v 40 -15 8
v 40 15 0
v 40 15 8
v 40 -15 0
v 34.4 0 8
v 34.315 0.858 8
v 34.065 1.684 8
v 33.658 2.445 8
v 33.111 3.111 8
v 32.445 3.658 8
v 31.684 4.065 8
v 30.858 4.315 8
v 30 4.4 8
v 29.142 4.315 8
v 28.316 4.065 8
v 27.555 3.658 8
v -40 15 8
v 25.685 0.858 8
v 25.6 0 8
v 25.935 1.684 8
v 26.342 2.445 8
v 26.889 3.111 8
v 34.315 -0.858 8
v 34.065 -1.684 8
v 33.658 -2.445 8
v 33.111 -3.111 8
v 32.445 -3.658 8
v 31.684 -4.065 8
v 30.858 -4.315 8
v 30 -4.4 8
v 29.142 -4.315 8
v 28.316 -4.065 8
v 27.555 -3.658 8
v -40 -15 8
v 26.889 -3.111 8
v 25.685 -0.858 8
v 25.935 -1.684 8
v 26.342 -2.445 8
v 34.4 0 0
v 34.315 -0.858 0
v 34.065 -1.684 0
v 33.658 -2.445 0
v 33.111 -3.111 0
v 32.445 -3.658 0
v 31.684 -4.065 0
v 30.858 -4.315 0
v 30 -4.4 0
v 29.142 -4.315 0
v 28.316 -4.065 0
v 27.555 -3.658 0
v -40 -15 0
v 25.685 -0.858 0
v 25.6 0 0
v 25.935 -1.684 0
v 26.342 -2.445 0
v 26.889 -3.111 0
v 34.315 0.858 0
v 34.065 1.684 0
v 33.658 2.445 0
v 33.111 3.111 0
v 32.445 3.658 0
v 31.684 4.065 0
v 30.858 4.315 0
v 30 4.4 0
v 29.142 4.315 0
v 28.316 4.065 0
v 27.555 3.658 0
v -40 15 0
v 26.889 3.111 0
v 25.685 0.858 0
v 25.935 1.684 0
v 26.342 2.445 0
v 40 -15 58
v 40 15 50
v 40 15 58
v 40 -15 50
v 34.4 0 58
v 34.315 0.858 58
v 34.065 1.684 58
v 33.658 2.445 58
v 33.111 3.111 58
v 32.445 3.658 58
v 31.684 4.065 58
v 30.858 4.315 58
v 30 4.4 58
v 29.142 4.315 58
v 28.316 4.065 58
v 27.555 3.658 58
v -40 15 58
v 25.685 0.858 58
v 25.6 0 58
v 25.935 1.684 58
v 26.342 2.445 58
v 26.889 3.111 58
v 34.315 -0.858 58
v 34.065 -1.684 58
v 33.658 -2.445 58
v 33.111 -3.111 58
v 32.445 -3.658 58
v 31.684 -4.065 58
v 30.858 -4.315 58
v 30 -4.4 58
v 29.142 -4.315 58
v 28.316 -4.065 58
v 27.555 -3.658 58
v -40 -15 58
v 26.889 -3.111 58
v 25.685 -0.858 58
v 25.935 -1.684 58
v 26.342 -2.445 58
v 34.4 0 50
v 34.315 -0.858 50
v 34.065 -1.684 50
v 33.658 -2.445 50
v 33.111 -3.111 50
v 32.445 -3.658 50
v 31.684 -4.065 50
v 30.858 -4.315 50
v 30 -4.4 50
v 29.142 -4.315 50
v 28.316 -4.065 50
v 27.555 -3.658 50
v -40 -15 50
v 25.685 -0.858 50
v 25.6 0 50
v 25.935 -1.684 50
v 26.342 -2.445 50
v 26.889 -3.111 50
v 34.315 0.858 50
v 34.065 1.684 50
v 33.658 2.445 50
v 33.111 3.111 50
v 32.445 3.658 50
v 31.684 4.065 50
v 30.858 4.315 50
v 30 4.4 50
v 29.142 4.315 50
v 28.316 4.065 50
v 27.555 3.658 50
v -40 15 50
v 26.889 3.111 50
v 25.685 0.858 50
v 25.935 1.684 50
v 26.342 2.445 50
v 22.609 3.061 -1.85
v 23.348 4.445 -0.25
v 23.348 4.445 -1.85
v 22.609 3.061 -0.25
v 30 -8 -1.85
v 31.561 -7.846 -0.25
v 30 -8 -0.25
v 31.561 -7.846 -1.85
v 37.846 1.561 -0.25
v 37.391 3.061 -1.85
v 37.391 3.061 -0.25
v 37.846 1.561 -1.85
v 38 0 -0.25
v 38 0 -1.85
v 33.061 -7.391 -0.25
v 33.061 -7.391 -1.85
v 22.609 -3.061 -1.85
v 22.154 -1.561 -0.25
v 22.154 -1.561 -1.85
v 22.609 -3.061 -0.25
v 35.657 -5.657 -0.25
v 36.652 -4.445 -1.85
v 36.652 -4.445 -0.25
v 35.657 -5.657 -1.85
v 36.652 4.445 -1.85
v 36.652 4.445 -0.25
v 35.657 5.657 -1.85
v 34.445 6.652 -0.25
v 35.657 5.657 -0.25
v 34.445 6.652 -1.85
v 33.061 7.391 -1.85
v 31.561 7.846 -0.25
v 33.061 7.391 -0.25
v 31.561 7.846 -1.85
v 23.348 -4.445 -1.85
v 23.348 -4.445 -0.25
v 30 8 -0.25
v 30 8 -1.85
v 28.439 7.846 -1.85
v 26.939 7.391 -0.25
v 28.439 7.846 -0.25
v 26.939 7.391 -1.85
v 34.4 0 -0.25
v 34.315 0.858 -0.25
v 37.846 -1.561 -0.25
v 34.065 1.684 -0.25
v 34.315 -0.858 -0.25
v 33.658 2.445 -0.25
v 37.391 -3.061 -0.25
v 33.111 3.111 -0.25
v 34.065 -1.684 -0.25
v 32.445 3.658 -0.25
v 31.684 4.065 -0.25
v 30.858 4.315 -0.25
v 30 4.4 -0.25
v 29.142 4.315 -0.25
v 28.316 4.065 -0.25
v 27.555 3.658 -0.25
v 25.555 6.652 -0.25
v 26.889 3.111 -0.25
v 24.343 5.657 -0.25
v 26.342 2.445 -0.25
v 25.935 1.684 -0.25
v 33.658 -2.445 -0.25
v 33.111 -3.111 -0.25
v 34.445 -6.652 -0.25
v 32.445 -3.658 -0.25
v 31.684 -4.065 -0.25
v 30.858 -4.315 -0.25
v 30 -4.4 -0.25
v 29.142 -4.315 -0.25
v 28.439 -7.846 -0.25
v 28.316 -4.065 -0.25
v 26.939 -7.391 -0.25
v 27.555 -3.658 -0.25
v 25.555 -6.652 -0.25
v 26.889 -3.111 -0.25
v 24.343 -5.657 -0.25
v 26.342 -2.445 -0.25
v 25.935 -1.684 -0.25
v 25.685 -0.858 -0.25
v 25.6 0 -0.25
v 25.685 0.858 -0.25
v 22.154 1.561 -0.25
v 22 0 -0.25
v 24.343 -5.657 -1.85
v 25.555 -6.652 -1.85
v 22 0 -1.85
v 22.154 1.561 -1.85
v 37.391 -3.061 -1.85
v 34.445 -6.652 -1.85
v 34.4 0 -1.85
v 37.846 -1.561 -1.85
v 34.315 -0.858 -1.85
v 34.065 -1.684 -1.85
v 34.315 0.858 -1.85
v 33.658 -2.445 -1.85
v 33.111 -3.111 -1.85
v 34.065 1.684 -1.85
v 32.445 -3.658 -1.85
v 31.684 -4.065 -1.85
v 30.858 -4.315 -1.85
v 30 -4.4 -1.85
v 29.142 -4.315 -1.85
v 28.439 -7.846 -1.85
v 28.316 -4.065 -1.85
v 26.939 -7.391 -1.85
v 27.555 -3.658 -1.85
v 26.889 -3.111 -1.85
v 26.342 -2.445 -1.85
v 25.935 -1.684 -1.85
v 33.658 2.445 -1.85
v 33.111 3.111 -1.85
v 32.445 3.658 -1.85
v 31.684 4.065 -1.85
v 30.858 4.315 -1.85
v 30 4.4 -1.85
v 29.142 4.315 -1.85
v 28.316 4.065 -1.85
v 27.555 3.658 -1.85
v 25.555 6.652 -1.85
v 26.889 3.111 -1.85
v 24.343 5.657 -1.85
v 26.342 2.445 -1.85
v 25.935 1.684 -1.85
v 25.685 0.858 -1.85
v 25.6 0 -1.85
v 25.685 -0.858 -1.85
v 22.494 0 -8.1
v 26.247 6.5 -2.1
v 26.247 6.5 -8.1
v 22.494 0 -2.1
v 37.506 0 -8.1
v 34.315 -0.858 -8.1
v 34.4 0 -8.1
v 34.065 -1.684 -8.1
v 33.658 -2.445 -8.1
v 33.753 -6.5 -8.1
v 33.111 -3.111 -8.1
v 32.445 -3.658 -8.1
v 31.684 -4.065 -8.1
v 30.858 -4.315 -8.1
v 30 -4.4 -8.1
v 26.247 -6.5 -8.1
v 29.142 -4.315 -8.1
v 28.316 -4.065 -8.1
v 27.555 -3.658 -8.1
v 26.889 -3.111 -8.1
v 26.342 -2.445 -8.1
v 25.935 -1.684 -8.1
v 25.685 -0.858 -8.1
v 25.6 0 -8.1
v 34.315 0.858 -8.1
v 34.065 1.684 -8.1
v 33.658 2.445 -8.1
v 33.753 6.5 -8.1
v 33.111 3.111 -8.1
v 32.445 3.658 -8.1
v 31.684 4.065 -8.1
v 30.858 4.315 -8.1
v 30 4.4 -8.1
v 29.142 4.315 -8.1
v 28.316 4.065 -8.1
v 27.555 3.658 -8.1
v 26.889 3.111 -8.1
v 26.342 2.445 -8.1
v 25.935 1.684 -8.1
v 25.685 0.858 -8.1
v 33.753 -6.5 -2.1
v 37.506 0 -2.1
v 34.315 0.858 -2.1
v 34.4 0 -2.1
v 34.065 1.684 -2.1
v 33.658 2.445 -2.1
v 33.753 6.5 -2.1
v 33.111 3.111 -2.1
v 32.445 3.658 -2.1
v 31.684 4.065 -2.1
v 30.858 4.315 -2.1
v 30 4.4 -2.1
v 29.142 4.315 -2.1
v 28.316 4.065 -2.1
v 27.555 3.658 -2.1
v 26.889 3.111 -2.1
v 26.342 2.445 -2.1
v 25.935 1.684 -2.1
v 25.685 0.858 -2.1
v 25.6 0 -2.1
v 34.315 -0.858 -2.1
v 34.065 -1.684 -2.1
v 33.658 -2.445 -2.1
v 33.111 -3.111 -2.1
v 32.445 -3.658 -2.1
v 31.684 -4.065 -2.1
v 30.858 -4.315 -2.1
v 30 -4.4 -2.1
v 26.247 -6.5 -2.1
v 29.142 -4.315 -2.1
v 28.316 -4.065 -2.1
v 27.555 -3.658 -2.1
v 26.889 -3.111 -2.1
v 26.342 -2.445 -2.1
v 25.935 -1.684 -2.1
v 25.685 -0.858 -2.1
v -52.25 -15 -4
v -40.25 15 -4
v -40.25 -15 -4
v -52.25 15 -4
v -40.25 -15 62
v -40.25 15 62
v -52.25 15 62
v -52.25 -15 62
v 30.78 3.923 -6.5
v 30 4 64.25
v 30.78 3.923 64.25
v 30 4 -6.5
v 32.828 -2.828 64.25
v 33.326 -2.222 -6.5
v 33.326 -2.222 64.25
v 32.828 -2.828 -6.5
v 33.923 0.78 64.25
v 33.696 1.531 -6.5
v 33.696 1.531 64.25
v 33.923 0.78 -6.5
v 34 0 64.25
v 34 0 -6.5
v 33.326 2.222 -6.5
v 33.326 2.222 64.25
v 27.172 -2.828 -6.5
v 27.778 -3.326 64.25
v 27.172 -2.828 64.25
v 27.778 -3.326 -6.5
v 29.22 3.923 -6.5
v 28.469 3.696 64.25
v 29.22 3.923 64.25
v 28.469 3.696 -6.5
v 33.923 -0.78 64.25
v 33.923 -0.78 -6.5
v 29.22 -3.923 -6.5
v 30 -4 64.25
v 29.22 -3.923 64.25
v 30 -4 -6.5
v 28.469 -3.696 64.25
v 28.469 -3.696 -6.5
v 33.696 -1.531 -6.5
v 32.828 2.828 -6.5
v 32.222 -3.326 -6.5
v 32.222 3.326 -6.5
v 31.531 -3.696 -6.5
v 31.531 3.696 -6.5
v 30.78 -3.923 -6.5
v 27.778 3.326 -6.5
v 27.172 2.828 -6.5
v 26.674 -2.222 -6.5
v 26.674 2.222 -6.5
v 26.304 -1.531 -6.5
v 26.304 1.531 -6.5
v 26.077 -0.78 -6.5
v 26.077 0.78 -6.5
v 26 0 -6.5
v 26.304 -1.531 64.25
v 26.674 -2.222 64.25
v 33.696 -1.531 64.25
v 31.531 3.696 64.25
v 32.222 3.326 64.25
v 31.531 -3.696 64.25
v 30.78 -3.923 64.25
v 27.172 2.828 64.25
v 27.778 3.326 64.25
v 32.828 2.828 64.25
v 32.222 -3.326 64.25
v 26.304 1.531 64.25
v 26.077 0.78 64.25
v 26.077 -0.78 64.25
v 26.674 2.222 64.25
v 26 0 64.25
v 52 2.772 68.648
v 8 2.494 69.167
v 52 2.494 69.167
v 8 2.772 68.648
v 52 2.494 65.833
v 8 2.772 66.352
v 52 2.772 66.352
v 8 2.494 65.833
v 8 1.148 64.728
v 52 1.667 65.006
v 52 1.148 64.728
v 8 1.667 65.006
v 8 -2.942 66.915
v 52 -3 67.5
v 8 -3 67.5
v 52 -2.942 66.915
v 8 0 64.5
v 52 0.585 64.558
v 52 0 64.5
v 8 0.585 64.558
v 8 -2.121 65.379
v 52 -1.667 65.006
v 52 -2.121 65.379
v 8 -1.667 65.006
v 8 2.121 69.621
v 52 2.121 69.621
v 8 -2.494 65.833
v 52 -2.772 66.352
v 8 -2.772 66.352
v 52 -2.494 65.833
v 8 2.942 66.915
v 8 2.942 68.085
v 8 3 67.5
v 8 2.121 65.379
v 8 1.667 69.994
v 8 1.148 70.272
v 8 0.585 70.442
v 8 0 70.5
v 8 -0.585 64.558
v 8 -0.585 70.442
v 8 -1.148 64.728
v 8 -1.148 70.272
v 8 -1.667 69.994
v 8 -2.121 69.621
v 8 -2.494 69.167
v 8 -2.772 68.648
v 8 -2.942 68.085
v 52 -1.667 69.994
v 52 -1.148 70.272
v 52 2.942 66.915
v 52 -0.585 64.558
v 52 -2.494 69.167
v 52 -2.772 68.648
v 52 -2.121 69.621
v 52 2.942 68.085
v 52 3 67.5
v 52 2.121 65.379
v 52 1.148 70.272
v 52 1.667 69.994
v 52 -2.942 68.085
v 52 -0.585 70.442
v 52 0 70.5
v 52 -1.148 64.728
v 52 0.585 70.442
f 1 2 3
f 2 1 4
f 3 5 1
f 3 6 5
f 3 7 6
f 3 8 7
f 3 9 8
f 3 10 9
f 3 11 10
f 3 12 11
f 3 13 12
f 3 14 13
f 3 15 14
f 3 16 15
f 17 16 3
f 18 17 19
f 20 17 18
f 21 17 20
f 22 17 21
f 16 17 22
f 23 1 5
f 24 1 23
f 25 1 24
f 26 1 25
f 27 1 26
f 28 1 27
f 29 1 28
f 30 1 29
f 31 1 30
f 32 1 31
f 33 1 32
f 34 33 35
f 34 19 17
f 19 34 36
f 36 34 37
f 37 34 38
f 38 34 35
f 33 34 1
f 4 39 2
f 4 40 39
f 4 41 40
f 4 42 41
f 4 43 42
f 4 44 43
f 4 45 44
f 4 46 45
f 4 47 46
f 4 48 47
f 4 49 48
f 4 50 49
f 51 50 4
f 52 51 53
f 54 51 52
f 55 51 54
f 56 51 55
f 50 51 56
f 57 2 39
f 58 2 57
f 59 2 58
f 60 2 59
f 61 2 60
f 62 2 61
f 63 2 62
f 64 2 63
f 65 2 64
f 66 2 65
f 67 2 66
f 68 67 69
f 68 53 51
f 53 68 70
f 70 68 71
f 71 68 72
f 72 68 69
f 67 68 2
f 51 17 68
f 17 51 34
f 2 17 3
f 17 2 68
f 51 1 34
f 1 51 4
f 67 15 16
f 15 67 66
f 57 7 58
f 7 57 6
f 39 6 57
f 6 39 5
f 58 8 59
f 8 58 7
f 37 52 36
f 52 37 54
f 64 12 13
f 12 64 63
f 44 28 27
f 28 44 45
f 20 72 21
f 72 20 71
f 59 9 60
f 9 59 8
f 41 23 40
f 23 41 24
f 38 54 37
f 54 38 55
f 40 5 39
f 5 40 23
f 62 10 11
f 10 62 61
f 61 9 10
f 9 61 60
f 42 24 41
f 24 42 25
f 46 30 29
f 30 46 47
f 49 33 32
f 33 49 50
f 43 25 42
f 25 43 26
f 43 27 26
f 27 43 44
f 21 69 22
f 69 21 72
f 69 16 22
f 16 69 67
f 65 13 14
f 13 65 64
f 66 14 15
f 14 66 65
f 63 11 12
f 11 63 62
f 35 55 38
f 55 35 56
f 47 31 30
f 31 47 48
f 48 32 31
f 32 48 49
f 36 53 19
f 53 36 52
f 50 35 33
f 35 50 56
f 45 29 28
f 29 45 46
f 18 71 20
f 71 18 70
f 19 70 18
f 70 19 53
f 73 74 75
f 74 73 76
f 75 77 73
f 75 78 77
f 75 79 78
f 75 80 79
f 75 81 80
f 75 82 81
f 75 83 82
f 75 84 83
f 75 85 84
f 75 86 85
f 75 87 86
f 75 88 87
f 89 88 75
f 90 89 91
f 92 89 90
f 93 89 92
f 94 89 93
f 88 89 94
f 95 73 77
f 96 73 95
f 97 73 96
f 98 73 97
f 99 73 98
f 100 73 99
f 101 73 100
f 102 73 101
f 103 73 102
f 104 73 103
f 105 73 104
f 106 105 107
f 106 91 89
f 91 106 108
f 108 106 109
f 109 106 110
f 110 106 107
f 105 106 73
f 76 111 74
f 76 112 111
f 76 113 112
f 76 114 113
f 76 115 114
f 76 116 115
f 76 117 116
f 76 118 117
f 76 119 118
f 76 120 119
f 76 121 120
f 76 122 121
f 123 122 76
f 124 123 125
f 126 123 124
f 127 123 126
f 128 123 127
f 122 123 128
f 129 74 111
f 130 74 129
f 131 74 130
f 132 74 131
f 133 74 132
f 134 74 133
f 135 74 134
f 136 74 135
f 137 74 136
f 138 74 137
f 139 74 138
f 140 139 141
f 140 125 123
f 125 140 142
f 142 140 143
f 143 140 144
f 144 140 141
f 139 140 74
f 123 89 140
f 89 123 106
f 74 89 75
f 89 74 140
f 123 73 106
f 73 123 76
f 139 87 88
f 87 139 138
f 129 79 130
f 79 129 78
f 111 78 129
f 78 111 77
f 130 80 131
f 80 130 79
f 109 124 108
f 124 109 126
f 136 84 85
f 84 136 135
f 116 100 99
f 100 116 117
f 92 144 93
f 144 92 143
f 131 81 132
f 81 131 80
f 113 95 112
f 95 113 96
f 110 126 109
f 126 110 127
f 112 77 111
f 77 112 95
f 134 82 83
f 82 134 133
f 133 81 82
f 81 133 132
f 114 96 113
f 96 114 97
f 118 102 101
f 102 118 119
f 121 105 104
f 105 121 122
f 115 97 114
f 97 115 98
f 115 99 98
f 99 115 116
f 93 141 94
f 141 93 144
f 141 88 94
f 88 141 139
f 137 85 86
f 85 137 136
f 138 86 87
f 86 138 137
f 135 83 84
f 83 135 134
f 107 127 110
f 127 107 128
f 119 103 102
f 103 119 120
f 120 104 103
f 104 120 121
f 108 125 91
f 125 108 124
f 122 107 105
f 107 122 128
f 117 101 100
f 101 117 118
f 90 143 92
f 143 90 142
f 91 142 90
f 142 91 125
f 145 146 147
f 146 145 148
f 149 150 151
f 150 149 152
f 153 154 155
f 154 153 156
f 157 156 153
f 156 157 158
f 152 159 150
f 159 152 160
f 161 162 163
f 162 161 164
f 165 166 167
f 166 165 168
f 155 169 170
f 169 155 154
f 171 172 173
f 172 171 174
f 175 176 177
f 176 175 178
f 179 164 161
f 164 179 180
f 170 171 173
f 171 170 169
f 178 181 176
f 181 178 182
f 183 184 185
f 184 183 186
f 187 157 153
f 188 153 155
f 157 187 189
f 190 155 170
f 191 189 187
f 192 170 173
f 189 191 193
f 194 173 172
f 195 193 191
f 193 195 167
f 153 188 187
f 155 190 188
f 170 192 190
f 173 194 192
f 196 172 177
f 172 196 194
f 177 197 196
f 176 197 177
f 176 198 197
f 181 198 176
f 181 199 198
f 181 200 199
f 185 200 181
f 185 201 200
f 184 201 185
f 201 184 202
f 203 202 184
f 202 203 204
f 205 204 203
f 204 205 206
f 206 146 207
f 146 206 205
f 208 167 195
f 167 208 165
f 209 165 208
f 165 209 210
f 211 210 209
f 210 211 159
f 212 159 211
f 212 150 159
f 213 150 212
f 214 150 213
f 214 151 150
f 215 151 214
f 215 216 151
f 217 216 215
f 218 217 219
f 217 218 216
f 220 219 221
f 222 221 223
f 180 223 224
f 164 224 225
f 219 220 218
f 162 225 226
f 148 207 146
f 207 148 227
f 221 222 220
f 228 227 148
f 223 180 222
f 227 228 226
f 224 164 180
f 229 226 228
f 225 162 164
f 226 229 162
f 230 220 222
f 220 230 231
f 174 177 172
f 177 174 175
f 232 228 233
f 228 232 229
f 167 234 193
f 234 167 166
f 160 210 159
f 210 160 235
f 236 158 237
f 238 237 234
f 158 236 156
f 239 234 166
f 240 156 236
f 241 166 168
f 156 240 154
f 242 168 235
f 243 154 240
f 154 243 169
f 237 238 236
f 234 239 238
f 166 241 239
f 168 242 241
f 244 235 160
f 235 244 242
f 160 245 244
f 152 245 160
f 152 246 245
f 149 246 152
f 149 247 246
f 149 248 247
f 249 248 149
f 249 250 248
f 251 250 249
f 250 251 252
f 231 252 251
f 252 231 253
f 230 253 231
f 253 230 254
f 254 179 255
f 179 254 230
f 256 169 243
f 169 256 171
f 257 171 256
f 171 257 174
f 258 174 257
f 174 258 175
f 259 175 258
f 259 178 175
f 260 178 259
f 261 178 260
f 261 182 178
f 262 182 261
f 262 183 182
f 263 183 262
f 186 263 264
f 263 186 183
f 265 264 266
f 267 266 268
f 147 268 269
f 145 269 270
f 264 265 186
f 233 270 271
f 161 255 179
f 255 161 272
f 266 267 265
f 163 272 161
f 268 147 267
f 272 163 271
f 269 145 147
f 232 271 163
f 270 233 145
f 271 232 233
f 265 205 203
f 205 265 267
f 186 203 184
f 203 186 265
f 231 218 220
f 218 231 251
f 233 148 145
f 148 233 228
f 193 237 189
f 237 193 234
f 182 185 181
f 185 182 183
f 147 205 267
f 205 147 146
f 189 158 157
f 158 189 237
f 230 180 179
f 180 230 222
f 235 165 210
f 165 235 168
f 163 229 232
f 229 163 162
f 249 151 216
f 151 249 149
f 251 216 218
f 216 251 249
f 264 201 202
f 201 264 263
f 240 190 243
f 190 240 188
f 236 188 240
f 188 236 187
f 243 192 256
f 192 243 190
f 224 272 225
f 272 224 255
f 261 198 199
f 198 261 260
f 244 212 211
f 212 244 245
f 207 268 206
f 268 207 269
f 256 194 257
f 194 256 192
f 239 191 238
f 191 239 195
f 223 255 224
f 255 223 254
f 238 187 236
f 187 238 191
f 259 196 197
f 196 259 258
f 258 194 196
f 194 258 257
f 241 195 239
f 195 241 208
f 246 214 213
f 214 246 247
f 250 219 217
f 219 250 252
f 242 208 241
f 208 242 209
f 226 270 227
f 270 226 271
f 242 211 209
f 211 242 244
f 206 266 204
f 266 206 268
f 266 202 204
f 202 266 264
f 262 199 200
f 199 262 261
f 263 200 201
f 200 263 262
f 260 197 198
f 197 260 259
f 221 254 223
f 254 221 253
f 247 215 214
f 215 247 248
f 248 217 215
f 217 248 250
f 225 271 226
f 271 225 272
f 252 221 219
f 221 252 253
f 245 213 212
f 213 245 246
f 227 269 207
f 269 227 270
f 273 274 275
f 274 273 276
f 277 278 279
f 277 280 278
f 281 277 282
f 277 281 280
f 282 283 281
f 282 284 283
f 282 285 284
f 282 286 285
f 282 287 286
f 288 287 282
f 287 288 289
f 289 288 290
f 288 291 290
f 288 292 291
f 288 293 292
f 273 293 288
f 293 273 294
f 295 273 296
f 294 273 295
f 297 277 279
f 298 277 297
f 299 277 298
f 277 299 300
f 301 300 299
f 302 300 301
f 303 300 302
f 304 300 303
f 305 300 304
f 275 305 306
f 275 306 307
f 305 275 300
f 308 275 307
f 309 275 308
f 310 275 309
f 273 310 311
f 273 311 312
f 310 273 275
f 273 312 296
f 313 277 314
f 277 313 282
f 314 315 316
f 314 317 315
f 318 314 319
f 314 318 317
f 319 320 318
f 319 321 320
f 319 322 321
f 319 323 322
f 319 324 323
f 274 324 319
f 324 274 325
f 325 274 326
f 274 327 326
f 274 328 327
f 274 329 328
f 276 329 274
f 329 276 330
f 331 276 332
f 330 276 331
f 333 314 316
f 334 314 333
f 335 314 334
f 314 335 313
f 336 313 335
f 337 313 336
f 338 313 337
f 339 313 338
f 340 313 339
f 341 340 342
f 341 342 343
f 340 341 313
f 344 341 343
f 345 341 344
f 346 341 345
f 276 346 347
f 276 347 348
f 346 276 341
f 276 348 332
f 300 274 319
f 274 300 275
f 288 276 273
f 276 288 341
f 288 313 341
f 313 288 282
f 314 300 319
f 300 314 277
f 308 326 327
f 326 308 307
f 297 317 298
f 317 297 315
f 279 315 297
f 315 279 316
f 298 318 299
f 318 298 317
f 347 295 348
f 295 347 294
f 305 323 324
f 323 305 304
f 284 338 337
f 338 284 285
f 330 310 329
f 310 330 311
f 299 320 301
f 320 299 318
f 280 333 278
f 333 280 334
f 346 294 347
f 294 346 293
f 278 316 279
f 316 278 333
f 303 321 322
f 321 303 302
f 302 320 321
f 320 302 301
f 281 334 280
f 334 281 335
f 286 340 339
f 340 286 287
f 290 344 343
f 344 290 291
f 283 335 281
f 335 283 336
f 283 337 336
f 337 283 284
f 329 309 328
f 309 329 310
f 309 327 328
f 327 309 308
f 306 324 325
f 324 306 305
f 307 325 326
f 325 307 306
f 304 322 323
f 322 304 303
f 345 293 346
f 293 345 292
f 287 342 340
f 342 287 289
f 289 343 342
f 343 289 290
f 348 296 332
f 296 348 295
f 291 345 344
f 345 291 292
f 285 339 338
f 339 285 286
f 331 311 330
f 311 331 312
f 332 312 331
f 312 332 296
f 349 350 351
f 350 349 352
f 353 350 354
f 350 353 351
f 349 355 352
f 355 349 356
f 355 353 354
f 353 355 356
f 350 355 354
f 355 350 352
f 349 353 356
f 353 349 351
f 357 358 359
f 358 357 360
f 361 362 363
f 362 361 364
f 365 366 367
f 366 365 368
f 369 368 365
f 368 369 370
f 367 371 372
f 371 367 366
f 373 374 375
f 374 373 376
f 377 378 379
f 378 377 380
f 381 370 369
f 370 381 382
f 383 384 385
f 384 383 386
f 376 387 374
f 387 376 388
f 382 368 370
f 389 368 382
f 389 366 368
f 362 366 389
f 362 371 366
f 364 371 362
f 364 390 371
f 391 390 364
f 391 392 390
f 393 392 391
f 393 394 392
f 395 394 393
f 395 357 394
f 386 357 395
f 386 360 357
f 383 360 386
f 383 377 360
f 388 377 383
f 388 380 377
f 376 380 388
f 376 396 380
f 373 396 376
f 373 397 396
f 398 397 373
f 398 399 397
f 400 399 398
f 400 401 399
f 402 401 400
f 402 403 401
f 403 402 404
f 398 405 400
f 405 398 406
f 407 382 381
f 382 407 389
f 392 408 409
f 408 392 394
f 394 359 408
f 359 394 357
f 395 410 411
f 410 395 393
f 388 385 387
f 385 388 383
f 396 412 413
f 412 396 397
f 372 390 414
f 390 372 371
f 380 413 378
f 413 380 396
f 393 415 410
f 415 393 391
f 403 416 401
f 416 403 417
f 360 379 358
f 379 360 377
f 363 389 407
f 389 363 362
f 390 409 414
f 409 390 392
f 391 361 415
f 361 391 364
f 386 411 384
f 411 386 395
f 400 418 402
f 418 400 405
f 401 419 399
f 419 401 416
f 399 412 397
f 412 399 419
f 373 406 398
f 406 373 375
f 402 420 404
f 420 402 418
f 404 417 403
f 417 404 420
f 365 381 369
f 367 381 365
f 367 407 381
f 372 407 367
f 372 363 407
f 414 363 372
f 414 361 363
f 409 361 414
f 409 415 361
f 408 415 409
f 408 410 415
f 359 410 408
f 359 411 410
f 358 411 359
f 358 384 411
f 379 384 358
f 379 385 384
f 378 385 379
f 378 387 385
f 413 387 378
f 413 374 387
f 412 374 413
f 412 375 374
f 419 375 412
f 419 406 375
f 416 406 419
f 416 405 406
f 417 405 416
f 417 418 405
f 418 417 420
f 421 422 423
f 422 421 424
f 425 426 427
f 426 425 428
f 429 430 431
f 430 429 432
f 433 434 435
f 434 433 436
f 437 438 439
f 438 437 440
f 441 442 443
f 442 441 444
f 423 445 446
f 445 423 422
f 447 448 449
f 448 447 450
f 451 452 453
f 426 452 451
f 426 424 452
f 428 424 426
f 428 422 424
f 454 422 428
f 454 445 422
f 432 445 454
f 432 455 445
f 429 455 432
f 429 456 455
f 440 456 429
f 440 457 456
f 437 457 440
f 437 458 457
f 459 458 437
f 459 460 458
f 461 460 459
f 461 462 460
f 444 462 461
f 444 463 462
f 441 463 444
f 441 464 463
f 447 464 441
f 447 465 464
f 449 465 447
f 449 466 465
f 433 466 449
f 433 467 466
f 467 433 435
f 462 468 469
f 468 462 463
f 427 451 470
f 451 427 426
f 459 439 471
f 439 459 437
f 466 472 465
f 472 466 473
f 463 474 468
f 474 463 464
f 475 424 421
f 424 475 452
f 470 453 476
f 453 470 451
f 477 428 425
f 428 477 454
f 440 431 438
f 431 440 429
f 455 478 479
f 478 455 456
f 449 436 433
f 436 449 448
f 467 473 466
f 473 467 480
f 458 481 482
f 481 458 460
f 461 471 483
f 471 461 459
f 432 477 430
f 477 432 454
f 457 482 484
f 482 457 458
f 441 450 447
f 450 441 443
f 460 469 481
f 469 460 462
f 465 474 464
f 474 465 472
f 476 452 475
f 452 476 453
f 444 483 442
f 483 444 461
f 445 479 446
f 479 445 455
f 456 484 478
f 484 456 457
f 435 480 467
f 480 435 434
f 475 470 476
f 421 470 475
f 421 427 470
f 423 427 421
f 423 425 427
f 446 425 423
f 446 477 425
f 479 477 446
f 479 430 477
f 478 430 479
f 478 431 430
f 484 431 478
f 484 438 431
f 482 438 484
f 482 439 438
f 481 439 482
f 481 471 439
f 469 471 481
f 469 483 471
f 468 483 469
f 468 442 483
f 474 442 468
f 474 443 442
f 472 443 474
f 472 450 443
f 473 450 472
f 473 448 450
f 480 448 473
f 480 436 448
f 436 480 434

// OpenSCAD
$fn = 32;

// ------------------------------------------------------------------------
// C clamp: throat 50 mm, screw d8
// Every part is its own module, assembly() places every instance.
// ------------------------------------------------------------------------

// --- part 1 ---
module clamp_arm() {
  difference() {
    translate([-40, -15, 0]) cube([80, 30, 8]);
    translate([30, 0, -1]) cylinder(h = 10, d = 8.8);
  }
}

// --- part 2 ---
module clamp_spine() {
  difference() {
    translate([-33, -15, 0]) cube([66, 30, 12]);
  }
}

// --- part 3 ---
module clamp_screw() {
  translate([0, 0, -35.375]) cylinder(h = 70.75, d = 8);
}

// --- part 4 ---
module clamp_washer() {
  difference() {
      translate([0, 0, 0]) cylinder(h = 1.6, d = 16);
      translate([0, 0, -1]) cylinder(h = 3.6, d = 8.8);
    }
}

// --- part 5 ---
module clamp_nut() {
  difference() {
    linear_extrude(height = 6) polygon(points = [[7.506, 0], [3.753, 6.5], [-3.753, 6.5], [-7.506, 0], [-3.753, -6.5], [3.753, -6.5]]);
    translate([0, 0, -1]) cylinder(h = 8, d = 8.8);
  }
}

// --- part 6 ---
module tommy_bar() {
  translate([0, 0, -22]) cylinder(h = 44, d = 6);
}

// --- assembly ---
module assembly() {
  color([0.80, 0.24, 0.20]) translate([0, 0, 0]) rotate([0, 0, 0]) clamp_arm();
  color([0.20, 0.45, 0.75]) translate([0, 0, 50]) rotate([0, 0, 0]) clamp_arm();
  color([0.25, 0.62, 0.32]) translate([-52.25, 0, 29]) rotate([0, 90, 0]) clamp_spine();
  color([0.92, 0.70, 0.18]) translate([30, 0, 28.875]) rotate([0, 0, 0]) clamp_screw();
  color([0.58, 0.35, 0.70]) translate([30, 0, -1.85]) rotate([0, 0, 0]) clamp_washer();
  color([0.16, 0.66, 0.66]) translate([30, 0, -8.1]) rotate([0, 0, 0]) clamp_nut();
  color([0.85, 0.48, 0.18]) translate([30, 0, 67.5]) rotate([0, 90, 0]) tommy_bar();
}

assembly();
